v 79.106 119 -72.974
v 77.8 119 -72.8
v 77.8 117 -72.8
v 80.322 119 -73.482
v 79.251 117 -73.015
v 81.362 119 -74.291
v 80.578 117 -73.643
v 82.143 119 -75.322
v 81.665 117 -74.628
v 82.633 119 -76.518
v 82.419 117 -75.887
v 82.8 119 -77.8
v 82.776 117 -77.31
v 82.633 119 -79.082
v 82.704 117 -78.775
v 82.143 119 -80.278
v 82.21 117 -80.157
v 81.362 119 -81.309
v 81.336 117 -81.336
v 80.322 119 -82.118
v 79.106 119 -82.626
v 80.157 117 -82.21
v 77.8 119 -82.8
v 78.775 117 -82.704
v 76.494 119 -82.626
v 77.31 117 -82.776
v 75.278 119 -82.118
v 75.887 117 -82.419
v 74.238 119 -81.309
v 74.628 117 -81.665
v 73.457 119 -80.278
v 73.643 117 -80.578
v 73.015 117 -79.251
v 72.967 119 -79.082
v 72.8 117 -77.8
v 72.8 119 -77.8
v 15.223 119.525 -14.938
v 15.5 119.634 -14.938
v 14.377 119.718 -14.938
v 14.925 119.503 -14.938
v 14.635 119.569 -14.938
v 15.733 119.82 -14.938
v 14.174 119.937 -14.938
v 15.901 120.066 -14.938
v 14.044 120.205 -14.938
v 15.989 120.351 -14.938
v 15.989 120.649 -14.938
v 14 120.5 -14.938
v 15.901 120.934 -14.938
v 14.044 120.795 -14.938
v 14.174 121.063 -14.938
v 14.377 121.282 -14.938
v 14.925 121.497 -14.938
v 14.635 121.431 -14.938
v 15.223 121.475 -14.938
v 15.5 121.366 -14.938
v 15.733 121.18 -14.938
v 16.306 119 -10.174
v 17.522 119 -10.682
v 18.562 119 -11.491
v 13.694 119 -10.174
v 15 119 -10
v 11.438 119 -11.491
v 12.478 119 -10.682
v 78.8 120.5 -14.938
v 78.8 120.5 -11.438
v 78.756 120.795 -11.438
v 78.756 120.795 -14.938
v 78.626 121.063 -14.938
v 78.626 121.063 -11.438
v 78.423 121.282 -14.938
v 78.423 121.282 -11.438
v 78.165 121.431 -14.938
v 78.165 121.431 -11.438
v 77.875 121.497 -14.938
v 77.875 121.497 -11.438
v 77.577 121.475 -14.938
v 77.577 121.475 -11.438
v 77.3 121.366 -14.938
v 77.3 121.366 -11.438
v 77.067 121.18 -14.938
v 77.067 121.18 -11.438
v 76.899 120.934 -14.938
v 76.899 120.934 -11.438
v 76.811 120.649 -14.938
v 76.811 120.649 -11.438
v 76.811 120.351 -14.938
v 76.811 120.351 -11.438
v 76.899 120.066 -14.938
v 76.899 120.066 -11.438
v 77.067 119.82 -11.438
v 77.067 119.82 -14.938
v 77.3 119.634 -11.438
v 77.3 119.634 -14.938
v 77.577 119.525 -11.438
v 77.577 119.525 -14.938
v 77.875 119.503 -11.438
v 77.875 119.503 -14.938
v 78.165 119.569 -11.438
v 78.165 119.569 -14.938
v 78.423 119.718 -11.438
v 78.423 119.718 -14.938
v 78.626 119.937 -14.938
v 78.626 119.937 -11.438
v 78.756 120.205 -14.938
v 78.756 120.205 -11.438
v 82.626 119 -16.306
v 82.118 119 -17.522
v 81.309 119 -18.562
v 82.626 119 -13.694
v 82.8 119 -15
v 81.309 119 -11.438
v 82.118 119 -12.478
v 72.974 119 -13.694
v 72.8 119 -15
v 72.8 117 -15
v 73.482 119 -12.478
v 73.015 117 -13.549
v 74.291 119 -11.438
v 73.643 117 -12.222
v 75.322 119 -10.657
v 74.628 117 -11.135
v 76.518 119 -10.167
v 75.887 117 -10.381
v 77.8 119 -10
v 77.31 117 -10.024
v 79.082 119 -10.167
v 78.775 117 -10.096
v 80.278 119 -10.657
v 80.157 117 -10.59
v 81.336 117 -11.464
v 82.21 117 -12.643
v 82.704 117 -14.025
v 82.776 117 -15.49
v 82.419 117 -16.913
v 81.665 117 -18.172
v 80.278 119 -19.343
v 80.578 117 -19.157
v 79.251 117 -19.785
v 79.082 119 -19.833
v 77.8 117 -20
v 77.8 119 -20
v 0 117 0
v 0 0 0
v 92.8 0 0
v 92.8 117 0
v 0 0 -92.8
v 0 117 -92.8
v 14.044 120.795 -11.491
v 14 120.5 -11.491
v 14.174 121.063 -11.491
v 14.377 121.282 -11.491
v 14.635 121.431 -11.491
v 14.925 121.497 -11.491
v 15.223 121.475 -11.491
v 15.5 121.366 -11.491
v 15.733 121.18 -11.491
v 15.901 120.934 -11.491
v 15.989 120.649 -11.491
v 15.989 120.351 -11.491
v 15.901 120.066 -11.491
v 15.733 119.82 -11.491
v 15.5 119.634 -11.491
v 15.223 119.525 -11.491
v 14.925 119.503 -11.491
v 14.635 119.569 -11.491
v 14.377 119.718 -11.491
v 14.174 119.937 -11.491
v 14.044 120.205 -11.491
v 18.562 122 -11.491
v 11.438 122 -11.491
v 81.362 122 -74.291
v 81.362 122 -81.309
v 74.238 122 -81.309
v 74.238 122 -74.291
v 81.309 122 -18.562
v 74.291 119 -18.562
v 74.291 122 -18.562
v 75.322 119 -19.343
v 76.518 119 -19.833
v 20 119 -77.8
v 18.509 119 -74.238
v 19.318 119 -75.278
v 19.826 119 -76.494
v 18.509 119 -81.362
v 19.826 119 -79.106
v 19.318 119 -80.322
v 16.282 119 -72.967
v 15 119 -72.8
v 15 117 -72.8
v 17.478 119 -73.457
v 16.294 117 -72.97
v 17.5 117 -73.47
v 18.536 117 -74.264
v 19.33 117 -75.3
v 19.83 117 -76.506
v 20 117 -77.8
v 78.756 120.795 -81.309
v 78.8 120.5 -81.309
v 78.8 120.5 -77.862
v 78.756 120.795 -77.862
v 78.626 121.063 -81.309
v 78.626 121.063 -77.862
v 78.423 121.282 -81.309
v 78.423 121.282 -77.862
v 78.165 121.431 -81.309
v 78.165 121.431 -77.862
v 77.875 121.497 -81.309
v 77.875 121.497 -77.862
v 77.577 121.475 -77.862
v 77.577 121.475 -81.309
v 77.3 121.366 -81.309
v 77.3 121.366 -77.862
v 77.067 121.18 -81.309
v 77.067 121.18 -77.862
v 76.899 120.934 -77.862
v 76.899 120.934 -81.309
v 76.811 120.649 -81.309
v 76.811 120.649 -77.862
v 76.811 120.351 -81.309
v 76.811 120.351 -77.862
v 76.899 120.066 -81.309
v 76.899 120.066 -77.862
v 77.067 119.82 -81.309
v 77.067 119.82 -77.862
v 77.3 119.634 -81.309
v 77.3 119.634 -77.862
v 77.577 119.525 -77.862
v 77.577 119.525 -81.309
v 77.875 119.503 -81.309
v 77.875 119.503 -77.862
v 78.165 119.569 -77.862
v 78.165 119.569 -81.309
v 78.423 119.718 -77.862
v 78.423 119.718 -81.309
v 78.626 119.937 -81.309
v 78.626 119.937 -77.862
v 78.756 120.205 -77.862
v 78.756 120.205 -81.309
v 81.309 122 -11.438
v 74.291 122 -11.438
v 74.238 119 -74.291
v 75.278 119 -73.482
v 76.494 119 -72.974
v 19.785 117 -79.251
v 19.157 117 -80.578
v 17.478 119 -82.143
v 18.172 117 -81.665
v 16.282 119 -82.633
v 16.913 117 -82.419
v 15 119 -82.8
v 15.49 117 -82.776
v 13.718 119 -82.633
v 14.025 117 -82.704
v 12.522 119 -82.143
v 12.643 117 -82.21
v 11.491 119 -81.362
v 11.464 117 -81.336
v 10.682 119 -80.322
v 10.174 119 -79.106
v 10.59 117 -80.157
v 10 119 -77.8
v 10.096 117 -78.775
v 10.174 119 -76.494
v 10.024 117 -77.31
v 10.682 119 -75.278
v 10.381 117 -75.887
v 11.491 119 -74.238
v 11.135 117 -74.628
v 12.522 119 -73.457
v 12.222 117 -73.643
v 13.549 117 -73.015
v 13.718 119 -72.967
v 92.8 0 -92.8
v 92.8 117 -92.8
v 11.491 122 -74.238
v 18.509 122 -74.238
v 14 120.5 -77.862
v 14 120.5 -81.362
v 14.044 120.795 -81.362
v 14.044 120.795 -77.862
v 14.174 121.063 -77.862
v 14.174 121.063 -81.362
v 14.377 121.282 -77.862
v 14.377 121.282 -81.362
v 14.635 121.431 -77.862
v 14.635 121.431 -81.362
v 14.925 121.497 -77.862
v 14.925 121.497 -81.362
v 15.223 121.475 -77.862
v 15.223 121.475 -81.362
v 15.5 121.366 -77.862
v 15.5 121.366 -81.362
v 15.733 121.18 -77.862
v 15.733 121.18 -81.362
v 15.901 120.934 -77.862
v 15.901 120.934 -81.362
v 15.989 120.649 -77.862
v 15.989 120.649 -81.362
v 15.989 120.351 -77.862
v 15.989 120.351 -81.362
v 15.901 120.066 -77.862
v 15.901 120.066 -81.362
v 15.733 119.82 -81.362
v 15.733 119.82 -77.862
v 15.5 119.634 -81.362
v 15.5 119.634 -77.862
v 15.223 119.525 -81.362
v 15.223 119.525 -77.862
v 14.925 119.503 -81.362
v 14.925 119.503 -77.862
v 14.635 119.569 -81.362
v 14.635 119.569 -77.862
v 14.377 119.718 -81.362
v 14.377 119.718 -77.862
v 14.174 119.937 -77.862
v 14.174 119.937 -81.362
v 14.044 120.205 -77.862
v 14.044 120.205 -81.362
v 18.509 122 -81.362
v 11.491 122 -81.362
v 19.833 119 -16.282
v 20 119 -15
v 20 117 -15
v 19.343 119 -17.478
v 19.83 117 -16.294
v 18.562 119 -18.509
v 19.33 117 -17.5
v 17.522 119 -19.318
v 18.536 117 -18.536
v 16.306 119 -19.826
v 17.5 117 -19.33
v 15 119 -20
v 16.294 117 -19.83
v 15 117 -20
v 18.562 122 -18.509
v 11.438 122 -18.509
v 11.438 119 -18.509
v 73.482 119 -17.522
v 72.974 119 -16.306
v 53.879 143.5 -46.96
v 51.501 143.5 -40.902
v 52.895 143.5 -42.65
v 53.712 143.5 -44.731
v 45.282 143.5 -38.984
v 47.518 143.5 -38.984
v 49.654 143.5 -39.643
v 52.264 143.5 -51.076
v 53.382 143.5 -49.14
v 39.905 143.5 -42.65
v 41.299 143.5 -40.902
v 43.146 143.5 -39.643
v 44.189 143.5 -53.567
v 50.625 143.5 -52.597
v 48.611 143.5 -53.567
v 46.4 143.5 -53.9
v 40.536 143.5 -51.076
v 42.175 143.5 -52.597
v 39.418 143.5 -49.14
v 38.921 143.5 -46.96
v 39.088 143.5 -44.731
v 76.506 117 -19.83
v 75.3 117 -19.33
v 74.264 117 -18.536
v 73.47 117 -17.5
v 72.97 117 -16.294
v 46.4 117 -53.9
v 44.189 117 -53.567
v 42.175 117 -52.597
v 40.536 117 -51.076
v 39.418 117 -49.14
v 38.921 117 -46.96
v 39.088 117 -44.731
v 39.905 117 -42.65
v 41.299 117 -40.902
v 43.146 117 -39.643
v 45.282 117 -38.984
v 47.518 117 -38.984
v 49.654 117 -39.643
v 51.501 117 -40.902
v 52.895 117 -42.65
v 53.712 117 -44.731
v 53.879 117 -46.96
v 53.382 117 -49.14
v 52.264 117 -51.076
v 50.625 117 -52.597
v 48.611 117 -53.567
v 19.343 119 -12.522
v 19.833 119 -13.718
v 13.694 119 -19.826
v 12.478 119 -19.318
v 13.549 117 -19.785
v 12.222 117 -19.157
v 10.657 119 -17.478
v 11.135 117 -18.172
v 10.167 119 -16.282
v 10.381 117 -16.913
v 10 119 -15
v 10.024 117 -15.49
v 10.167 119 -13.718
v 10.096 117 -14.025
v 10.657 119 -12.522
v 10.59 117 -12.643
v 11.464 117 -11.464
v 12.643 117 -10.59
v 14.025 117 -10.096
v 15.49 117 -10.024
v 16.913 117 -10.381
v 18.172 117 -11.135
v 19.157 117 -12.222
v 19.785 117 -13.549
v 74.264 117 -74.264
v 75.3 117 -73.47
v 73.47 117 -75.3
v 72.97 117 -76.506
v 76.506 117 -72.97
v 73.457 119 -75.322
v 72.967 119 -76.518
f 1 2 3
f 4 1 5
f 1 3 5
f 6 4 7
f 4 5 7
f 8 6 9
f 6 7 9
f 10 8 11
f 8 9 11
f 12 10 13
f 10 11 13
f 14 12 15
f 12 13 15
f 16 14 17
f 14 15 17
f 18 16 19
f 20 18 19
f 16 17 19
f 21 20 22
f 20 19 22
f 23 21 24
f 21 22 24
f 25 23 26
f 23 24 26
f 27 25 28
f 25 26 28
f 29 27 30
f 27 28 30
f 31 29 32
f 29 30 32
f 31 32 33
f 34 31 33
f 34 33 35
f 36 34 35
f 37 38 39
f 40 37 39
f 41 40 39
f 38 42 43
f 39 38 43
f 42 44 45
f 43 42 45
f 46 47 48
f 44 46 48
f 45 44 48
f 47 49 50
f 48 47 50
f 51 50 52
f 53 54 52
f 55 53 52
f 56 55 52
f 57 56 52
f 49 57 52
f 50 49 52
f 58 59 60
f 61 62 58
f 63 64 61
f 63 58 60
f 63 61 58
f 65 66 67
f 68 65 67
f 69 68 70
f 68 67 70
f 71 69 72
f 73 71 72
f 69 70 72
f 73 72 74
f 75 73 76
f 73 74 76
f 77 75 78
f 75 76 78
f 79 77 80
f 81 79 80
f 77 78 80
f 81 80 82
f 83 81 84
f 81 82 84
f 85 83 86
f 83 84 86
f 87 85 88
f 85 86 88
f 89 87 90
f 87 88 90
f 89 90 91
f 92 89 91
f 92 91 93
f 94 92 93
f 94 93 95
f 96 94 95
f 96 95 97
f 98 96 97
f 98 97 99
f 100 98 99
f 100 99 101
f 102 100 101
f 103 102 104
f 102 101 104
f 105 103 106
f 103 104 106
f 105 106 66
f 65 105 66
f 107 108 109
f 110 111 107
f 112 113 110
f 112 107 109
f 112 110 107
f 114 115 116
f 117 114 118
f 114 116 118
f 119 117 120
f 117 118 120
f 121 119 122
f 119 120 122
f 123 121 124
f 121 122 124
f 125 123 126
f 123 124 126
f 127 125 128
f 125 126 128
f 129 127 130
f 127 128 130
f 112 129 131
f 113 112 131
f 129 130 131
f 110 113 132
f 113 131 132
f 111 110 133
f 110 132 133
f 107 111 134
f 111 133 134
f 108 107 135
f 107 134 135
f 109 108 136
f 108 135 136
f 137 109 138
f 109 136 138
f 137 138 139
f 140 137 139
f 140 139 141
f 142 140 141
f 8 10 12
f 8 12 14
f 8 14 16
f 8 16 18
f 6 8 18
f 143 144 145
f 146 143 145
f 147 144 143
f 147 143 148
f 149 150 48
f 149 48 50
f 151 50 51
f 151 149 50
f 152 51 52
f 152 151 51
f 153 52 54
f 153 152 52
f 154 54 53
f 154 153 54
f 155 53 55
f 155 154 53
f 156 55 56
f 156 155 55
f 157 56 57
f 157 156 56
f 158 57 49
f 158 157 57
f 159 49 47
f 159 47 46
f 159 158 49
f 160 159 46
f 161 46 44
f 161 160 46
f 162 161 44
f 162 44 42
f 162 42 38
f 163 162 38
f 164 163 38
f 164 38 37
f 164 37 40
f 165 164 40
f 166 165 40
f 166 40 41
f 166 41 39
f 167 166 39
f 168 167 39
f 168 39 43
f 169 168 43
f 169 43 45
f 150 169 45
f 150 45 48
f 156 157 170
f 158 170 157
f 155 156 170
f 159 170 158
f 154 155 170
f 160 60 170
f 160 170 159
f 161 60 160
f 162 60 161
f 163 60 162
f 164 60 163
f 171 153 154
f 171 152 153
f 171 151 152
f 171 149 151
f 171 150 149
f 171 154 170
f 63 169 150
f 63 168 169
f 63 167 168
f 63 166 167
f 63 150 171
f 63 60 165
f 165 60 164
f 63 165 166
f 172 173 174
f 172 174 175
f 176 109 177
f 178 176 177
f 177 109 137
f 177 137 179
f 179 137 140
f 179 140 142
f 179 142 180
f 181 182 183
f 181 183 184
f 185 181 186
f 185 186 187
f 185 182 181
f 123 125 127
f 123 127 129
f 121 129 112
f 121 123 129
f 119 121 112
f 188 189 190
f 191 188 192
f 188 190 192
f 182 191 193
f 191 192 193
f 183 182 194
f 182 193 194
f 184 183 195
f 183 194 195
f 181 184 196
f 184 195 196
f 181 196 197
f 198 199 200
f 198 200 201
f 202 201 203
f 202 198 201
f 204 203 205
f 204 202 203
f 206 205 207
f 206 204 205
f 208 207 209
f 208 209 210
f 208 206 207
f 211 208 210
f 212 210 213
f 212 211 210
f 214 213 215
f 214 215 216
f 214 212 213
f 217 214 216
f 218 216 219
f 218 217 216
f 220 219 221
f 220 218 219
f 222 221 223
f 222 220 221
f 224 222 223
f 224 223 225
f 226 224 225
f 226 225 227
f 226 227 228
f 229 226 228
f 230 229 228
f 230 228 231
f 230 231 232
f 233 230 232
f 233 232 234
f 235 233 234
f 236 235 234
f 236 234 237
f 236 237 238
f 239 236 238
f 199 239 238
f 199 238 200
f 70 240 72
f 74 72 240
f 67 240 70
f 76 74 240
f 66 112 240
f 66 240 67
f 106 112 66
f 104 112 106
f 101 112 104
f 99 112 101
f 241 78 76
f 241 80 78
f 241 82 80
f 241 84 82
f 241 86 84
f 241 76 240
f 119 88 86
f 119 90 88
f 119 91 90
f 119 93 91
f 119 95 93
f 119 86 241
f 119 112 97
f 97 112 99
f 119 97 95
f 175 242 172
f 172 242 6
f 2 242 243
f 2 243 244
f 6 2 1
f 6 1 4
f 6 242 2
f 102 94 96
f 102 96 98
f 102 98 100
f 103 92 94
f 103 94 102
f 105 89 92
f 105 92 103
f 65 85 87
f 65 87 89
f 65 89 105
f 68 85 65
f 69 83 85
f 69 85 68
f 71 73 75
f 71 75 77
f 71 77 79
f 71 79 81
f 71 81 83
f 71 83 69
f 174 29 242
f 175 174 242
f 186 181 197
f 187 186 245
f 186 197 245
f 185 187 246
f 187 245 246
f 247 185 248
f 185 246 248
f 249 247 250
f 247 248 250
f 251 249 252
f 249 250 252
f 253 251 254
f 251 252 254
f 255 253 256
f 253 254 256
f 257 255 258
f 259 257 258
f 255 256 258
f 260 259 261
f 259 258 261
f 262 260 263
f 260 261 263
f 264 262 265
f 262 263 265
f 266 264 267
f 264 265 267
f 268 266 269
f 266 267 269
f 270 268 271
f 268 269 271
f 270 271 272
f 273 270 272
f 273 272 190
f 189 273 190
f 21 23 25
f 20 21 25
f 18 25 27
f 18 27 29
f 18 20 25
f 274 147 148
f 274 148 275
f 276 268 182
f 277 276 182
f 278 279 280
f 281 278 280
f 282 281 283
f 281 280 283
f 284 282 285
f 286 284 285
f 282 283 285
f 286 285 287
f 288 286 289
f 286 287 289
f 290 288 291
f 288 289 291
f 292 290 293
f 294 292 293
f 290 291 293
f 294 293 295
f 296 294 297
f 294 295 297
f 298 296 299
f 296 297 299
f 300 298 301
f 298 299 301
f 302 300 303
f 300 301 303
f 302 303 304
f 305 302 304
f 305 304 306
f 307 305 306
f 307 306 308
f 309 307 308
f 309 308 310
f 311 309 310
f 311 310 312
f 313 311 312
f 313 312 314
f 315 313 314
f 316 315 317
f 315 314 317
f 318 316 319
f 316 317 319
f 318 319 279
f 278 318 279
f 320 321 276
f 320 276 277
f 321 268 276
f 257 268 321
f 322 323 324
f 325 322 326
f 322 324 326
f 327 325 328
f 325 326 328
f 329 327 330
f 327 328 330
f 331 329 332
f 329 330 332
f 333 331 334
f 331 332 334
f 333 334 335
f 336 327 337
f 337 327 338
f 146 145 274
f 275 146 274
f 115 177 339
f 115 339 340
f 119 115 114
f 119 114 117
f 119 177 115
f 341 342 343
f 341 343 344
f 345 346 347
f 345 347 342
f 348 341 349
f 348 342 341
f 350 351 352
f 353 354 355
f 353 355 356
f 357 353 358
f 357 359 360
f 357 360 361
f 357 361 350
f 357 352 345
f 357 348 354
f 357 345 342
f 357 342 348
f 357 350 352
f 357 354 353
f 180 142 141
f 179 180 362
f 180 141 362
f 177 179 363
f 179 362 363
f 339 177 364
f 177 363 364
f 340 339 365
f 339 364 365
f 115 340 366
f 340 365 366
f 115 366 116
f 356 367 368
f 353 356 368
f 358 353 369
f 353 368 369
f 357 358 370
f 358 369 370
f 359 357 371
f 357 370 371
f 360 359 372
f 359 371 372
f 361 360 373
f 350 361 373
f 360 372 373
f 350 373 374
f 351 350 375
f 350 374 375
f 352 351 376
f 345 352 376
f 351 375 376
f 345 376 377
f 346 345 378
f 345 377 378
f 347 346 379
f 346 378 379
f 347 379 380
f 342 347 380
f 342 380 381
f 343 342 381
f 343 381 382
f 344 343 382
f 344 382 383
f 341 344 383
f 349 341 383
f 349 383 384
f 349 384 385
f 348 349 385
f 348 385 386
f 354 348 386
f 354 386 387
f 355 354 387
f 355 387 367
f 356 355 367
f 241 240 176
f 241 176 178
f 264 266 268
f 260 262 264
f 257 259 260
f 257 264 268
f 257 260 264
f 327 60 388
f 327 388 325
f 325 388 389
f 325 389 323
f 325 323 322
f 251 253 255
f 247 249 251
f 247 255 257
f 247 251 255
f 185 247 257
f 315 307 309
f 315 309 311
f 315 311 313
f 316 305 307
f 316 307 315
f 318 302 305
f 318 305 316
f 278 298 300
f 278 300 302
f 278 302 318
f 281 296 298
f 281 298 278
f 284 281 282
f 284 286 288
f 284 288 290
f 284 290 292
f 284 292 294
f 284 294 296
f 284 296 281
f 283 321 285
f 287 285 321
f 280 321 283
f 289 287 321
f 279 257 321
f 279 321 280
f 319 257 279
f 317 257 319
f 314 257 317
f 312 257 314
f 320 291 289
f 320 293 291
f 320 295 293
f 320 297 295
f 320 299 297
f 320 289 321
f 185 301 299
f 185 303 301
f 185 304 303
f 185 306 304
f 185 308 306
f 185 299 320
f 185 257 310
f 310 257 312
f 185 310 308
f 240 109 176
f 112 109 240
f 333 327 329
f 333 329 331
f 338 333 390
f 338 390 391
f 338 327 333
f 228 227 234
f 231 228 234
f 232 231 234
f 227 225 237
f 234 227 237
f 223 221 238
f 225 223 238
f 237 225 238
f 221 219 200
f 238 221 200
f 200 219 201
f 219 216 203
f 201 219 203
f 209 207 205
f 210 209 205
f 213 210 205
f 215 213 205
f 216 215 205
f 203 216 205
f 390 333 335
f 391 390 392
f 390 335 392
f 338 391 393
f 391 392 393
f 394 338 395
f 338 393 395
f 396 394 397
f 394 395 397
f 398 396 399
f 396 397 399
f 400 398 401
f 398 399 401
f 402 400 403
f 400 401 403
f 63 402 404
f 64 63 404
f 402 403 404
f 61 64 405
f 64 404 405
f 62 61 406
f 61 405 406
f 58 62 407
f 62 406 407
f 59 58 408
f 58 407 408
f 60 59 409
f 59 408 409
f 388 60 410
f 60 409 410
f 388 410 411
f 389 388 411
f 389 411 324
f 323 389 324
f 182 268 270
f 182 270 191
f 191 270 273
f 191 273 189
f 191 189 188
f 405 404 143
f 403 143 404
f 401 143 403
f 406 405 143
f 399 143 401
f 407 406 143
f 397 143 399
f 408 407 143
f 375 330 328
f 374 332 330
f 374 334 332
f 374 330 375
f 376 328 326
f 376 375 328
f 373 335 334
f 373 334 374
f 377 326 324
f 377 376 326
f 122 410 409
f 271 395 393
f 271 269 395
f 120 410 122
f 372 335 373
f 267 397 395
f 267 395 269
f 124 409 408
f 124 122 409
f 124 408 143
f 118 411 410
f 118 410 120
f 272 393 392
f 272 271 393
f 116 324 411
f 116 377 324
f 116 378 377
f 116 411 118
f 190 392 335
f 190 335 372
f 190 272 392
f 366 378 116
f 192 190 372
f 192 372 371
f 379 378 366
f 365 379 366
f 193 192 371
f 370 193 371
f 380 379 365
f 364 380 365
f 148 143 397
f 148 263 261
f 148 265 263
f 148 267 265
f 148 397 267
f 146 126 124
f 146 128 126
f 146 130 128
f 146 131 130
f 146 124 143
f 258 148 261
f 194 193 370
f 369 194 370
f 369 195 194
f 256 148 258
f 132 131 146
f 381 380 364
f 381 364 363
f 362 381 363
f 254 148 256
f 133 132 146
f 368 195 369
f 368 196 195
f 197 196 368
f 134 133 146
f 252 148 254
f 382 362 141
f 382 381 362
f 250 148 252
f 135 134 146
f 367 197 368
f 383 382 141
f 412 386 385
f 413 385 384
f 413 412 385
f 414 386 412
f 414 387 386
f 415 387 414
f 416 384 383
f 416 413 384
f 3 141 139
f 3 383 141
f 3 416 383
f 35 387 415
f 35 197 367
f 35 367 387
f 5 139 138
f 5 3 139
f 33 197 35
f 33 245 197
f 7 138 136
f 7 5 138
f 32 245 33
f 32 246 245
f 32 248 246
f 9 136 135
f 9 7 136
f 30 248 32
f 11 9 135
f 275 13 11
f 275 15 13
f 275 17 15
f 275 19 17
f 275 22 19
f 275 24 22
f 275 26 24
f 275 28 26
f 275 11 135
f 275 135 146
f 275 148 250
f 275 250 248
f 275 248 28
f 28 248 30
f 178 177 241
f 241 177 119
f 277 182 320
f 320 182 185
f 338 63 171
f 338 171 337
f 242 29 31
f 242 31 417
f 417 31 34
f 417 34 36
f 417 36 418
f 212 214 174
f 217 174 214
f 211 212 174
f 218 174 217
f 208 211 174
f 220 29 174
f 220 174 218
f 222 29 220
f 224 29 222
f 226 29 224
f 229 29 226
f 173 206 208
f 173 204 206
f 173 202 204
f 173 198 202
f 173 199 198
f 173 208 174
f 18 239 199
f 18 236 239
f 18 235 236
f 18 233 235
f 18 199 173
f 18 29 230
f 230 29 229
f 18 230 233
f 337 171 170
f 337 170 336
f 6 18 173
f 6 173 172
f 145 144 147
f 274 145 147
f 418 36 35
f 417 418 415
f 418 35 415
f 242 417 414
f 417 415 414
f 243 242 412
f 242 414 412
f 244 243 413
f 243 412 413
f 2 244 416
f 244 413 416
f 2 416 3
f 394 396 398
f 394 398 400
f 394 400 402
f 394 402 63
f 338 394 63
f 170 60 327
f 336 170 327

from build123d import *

# Parameters (mm, degrees)
SKETCH1_W                                  = 92.8
SKETCH1_H                                  = 92.8
BOSS_EXTRUDE1_DEPTH                        = 117
BOSS_EXTRUDE2_START                        = -117
SKETCH2_R                                  = 7.5
BOSS_EXTRUDE2_DEPTH                        = 143.5
BOSS_EXTRUDE3_DEPTH                        = 2
SKETCH4_W                                  = 7.017872994
SKETCH4_H                                  = 7.12386543
BOSS_EXTRUDE4_DEPTH                        = 3
SKETCH5_R                                  = 1
CUT_EXTRUDE1_DEPTH                         = 3.5
CIRPATTERN1_COUNT                          = 4
MIRROR2_AT_THE_SECOND_PLANE_COPY_1_SKETC_R = 1
MIRROR2_AT_THE_SECOND_PLANE_COPY_1_DEPTH   = 3.5


with BuildPart() as part:
    # Sketch1 → Boss-Extrude1 (new body)
    with BuildSketch(Plane(origin=(0, 0, 0), x_dir=(1, 0, 0), z_dir=(0, 1, 0))):
        with Locations((46.4, 46.4)):
            Rectangle(SKETCH1_W, SKETCH1_H)
    extrude(amount=BOSS_EXTRUDE1_DEPTH)

    # Sketch2 → Boss-Extrude2 (add)
    with BuildSketch(Plane(origin=(0, 117, 0), x_dir=(1, 0, 0), z_dir=(0, 1, 0)).offset(BOSS_EXTRUDE2_START)):
        with Locations(Location((46.4, 46.4, 0), (0, 0, 90))):
            Circle(SKETCH2_R)
    extrude(amount=BOSS_EXTRUDE2_DEPTH)

    # Sketch3 → Boss-Extrude3 (add)
    with BuildSketch(Plane(origin=(0, 117, 0), x_dir=(1, 0, 0), z_dir=(0, 1, 0))):
        with BuildLine():
            ThreePointArc((15, 72.8), (18.535533906, 74.264466094), (20, 77.8))
            Line((20, 77.8), (15, 77.8))
            Line((15, 77.8), (15, 72.8))
        make_face()
        with BuildLine():
            Line((15, 77.8), (20, 77.8))
            ThreePointArc((20, 77.8), (11.464466094, 81.335533906), (15, 72.8))
            Line((15, 72.8), (15, 77.8))
        make_face()
        with BuildLine():
            ThreePointArc((15, 72.8), (18.535533906, 74.264466094), (20, 77.8))
            Line((20, 77.8), (15, 77.8))
            Line((15, 77.8), (15, 72.8))
        make_face()
        with BuildLine():
            Line((15, 77.8), (20, 77.8))
            ThreePointArc((20, 77.8), (11.464466094, 81.335533906), (15, 72.8))
            Line((15, 72.8), (15, 77.8))
        make_face()
    boss_extrude3 = extrude(amount=BOSS_EXTRUDE3_DEPTH)

    # Sketch4 → Boss-Extrude4 (add)
    with BuildSketch(Plane(origin=(0, 119, 0), x_dir=(1, 0, 0), z_dir=(0, 1, 0))):
        with Locations((15, 77.8)):
            Rectangle(SKETCH4_W, SKETCH4_H)
    boss_extrude4 = extrude(amount=BOSS_EXTRUDE4_DEPTH)

    # Sketch5 → Cut-Extrude1 (cut)
    with BuildSketch(Plane(origin=(0, 0, -81.361932715), x_dir=(-1, 0, 0), z_dir=(0, 0, -1))):
        with Locations((-15, 120.5)):
            Circle(SKETCH5_R)
    cut_extrude1 = extrude(amount=-CUT_EXTRUDE1_DEPTH, mode=Mode.SUBTRACT)

    # CirPattern1: Boss-Extrude3, Boss-Extrude4 ×4 about axis
    cirpattern1_axis = Axis((46.4, 0, -46.4), (0, 1, 0))
    add([boss_extrude3.rotate(cirpattern1_axis, i * 360 / CIRPATTERN1_COUNT) for i in range(1, CIRPATTERN1_COUNT)])
    add([boss_extrude4.rotate(cirpattern1_axis, i * 360 / CIRPATTERN1_COUNT) for i in range(1, CIRPATTERN1_COUNT)])

    # Mirror1: Cut-Extrude1 across plane
    add(cut_extrude1.mirror(Plane(origin=(0, 0, -46.4), x_dir=(1, 0, 0), z_dir=(0, 0, -1))), mode=Mode.SUBTRACT)

    # Mirror2: Cut-Extrude1 across plane
    add(cut_extrude1.mirror(Plane(origin=(46.4, 0, 0), x_dir=(0, 0, 1), z_dir=(1, 0, 0))), mode=Mode.SUBTRACT)

    # Mirror2 at the second plane: Cut-Extrude1 across plane
    add(cut_extrude1.mirror(Plane(origin=(0, 0, -46.4), x_dir=(1, 0, 0), z_dir=(0, 0, -1))), mode=Mode.SUBTRACT)

    # Mirror2 at the second plane copy 1 sketc → Mirror2 at the second plane copy 1 (cut)
    with BuildSketch(Plane(origin=(92.8, 0, -11.438067285), x_dir=(1, 0, 0), z_dir=(0, 0, 1))):
        with Locations((-15, 120.5)):
            Circle(MIRROR2_AT_THE_SECOND_PLANE_COPY_1_SKETC_R)
    extrude(amount=-MIRROR2_AT_THE_SECOND_PLANE_COPY_1_DEPTH, mode=Mode.SUBTRACT)


solid = part.part
